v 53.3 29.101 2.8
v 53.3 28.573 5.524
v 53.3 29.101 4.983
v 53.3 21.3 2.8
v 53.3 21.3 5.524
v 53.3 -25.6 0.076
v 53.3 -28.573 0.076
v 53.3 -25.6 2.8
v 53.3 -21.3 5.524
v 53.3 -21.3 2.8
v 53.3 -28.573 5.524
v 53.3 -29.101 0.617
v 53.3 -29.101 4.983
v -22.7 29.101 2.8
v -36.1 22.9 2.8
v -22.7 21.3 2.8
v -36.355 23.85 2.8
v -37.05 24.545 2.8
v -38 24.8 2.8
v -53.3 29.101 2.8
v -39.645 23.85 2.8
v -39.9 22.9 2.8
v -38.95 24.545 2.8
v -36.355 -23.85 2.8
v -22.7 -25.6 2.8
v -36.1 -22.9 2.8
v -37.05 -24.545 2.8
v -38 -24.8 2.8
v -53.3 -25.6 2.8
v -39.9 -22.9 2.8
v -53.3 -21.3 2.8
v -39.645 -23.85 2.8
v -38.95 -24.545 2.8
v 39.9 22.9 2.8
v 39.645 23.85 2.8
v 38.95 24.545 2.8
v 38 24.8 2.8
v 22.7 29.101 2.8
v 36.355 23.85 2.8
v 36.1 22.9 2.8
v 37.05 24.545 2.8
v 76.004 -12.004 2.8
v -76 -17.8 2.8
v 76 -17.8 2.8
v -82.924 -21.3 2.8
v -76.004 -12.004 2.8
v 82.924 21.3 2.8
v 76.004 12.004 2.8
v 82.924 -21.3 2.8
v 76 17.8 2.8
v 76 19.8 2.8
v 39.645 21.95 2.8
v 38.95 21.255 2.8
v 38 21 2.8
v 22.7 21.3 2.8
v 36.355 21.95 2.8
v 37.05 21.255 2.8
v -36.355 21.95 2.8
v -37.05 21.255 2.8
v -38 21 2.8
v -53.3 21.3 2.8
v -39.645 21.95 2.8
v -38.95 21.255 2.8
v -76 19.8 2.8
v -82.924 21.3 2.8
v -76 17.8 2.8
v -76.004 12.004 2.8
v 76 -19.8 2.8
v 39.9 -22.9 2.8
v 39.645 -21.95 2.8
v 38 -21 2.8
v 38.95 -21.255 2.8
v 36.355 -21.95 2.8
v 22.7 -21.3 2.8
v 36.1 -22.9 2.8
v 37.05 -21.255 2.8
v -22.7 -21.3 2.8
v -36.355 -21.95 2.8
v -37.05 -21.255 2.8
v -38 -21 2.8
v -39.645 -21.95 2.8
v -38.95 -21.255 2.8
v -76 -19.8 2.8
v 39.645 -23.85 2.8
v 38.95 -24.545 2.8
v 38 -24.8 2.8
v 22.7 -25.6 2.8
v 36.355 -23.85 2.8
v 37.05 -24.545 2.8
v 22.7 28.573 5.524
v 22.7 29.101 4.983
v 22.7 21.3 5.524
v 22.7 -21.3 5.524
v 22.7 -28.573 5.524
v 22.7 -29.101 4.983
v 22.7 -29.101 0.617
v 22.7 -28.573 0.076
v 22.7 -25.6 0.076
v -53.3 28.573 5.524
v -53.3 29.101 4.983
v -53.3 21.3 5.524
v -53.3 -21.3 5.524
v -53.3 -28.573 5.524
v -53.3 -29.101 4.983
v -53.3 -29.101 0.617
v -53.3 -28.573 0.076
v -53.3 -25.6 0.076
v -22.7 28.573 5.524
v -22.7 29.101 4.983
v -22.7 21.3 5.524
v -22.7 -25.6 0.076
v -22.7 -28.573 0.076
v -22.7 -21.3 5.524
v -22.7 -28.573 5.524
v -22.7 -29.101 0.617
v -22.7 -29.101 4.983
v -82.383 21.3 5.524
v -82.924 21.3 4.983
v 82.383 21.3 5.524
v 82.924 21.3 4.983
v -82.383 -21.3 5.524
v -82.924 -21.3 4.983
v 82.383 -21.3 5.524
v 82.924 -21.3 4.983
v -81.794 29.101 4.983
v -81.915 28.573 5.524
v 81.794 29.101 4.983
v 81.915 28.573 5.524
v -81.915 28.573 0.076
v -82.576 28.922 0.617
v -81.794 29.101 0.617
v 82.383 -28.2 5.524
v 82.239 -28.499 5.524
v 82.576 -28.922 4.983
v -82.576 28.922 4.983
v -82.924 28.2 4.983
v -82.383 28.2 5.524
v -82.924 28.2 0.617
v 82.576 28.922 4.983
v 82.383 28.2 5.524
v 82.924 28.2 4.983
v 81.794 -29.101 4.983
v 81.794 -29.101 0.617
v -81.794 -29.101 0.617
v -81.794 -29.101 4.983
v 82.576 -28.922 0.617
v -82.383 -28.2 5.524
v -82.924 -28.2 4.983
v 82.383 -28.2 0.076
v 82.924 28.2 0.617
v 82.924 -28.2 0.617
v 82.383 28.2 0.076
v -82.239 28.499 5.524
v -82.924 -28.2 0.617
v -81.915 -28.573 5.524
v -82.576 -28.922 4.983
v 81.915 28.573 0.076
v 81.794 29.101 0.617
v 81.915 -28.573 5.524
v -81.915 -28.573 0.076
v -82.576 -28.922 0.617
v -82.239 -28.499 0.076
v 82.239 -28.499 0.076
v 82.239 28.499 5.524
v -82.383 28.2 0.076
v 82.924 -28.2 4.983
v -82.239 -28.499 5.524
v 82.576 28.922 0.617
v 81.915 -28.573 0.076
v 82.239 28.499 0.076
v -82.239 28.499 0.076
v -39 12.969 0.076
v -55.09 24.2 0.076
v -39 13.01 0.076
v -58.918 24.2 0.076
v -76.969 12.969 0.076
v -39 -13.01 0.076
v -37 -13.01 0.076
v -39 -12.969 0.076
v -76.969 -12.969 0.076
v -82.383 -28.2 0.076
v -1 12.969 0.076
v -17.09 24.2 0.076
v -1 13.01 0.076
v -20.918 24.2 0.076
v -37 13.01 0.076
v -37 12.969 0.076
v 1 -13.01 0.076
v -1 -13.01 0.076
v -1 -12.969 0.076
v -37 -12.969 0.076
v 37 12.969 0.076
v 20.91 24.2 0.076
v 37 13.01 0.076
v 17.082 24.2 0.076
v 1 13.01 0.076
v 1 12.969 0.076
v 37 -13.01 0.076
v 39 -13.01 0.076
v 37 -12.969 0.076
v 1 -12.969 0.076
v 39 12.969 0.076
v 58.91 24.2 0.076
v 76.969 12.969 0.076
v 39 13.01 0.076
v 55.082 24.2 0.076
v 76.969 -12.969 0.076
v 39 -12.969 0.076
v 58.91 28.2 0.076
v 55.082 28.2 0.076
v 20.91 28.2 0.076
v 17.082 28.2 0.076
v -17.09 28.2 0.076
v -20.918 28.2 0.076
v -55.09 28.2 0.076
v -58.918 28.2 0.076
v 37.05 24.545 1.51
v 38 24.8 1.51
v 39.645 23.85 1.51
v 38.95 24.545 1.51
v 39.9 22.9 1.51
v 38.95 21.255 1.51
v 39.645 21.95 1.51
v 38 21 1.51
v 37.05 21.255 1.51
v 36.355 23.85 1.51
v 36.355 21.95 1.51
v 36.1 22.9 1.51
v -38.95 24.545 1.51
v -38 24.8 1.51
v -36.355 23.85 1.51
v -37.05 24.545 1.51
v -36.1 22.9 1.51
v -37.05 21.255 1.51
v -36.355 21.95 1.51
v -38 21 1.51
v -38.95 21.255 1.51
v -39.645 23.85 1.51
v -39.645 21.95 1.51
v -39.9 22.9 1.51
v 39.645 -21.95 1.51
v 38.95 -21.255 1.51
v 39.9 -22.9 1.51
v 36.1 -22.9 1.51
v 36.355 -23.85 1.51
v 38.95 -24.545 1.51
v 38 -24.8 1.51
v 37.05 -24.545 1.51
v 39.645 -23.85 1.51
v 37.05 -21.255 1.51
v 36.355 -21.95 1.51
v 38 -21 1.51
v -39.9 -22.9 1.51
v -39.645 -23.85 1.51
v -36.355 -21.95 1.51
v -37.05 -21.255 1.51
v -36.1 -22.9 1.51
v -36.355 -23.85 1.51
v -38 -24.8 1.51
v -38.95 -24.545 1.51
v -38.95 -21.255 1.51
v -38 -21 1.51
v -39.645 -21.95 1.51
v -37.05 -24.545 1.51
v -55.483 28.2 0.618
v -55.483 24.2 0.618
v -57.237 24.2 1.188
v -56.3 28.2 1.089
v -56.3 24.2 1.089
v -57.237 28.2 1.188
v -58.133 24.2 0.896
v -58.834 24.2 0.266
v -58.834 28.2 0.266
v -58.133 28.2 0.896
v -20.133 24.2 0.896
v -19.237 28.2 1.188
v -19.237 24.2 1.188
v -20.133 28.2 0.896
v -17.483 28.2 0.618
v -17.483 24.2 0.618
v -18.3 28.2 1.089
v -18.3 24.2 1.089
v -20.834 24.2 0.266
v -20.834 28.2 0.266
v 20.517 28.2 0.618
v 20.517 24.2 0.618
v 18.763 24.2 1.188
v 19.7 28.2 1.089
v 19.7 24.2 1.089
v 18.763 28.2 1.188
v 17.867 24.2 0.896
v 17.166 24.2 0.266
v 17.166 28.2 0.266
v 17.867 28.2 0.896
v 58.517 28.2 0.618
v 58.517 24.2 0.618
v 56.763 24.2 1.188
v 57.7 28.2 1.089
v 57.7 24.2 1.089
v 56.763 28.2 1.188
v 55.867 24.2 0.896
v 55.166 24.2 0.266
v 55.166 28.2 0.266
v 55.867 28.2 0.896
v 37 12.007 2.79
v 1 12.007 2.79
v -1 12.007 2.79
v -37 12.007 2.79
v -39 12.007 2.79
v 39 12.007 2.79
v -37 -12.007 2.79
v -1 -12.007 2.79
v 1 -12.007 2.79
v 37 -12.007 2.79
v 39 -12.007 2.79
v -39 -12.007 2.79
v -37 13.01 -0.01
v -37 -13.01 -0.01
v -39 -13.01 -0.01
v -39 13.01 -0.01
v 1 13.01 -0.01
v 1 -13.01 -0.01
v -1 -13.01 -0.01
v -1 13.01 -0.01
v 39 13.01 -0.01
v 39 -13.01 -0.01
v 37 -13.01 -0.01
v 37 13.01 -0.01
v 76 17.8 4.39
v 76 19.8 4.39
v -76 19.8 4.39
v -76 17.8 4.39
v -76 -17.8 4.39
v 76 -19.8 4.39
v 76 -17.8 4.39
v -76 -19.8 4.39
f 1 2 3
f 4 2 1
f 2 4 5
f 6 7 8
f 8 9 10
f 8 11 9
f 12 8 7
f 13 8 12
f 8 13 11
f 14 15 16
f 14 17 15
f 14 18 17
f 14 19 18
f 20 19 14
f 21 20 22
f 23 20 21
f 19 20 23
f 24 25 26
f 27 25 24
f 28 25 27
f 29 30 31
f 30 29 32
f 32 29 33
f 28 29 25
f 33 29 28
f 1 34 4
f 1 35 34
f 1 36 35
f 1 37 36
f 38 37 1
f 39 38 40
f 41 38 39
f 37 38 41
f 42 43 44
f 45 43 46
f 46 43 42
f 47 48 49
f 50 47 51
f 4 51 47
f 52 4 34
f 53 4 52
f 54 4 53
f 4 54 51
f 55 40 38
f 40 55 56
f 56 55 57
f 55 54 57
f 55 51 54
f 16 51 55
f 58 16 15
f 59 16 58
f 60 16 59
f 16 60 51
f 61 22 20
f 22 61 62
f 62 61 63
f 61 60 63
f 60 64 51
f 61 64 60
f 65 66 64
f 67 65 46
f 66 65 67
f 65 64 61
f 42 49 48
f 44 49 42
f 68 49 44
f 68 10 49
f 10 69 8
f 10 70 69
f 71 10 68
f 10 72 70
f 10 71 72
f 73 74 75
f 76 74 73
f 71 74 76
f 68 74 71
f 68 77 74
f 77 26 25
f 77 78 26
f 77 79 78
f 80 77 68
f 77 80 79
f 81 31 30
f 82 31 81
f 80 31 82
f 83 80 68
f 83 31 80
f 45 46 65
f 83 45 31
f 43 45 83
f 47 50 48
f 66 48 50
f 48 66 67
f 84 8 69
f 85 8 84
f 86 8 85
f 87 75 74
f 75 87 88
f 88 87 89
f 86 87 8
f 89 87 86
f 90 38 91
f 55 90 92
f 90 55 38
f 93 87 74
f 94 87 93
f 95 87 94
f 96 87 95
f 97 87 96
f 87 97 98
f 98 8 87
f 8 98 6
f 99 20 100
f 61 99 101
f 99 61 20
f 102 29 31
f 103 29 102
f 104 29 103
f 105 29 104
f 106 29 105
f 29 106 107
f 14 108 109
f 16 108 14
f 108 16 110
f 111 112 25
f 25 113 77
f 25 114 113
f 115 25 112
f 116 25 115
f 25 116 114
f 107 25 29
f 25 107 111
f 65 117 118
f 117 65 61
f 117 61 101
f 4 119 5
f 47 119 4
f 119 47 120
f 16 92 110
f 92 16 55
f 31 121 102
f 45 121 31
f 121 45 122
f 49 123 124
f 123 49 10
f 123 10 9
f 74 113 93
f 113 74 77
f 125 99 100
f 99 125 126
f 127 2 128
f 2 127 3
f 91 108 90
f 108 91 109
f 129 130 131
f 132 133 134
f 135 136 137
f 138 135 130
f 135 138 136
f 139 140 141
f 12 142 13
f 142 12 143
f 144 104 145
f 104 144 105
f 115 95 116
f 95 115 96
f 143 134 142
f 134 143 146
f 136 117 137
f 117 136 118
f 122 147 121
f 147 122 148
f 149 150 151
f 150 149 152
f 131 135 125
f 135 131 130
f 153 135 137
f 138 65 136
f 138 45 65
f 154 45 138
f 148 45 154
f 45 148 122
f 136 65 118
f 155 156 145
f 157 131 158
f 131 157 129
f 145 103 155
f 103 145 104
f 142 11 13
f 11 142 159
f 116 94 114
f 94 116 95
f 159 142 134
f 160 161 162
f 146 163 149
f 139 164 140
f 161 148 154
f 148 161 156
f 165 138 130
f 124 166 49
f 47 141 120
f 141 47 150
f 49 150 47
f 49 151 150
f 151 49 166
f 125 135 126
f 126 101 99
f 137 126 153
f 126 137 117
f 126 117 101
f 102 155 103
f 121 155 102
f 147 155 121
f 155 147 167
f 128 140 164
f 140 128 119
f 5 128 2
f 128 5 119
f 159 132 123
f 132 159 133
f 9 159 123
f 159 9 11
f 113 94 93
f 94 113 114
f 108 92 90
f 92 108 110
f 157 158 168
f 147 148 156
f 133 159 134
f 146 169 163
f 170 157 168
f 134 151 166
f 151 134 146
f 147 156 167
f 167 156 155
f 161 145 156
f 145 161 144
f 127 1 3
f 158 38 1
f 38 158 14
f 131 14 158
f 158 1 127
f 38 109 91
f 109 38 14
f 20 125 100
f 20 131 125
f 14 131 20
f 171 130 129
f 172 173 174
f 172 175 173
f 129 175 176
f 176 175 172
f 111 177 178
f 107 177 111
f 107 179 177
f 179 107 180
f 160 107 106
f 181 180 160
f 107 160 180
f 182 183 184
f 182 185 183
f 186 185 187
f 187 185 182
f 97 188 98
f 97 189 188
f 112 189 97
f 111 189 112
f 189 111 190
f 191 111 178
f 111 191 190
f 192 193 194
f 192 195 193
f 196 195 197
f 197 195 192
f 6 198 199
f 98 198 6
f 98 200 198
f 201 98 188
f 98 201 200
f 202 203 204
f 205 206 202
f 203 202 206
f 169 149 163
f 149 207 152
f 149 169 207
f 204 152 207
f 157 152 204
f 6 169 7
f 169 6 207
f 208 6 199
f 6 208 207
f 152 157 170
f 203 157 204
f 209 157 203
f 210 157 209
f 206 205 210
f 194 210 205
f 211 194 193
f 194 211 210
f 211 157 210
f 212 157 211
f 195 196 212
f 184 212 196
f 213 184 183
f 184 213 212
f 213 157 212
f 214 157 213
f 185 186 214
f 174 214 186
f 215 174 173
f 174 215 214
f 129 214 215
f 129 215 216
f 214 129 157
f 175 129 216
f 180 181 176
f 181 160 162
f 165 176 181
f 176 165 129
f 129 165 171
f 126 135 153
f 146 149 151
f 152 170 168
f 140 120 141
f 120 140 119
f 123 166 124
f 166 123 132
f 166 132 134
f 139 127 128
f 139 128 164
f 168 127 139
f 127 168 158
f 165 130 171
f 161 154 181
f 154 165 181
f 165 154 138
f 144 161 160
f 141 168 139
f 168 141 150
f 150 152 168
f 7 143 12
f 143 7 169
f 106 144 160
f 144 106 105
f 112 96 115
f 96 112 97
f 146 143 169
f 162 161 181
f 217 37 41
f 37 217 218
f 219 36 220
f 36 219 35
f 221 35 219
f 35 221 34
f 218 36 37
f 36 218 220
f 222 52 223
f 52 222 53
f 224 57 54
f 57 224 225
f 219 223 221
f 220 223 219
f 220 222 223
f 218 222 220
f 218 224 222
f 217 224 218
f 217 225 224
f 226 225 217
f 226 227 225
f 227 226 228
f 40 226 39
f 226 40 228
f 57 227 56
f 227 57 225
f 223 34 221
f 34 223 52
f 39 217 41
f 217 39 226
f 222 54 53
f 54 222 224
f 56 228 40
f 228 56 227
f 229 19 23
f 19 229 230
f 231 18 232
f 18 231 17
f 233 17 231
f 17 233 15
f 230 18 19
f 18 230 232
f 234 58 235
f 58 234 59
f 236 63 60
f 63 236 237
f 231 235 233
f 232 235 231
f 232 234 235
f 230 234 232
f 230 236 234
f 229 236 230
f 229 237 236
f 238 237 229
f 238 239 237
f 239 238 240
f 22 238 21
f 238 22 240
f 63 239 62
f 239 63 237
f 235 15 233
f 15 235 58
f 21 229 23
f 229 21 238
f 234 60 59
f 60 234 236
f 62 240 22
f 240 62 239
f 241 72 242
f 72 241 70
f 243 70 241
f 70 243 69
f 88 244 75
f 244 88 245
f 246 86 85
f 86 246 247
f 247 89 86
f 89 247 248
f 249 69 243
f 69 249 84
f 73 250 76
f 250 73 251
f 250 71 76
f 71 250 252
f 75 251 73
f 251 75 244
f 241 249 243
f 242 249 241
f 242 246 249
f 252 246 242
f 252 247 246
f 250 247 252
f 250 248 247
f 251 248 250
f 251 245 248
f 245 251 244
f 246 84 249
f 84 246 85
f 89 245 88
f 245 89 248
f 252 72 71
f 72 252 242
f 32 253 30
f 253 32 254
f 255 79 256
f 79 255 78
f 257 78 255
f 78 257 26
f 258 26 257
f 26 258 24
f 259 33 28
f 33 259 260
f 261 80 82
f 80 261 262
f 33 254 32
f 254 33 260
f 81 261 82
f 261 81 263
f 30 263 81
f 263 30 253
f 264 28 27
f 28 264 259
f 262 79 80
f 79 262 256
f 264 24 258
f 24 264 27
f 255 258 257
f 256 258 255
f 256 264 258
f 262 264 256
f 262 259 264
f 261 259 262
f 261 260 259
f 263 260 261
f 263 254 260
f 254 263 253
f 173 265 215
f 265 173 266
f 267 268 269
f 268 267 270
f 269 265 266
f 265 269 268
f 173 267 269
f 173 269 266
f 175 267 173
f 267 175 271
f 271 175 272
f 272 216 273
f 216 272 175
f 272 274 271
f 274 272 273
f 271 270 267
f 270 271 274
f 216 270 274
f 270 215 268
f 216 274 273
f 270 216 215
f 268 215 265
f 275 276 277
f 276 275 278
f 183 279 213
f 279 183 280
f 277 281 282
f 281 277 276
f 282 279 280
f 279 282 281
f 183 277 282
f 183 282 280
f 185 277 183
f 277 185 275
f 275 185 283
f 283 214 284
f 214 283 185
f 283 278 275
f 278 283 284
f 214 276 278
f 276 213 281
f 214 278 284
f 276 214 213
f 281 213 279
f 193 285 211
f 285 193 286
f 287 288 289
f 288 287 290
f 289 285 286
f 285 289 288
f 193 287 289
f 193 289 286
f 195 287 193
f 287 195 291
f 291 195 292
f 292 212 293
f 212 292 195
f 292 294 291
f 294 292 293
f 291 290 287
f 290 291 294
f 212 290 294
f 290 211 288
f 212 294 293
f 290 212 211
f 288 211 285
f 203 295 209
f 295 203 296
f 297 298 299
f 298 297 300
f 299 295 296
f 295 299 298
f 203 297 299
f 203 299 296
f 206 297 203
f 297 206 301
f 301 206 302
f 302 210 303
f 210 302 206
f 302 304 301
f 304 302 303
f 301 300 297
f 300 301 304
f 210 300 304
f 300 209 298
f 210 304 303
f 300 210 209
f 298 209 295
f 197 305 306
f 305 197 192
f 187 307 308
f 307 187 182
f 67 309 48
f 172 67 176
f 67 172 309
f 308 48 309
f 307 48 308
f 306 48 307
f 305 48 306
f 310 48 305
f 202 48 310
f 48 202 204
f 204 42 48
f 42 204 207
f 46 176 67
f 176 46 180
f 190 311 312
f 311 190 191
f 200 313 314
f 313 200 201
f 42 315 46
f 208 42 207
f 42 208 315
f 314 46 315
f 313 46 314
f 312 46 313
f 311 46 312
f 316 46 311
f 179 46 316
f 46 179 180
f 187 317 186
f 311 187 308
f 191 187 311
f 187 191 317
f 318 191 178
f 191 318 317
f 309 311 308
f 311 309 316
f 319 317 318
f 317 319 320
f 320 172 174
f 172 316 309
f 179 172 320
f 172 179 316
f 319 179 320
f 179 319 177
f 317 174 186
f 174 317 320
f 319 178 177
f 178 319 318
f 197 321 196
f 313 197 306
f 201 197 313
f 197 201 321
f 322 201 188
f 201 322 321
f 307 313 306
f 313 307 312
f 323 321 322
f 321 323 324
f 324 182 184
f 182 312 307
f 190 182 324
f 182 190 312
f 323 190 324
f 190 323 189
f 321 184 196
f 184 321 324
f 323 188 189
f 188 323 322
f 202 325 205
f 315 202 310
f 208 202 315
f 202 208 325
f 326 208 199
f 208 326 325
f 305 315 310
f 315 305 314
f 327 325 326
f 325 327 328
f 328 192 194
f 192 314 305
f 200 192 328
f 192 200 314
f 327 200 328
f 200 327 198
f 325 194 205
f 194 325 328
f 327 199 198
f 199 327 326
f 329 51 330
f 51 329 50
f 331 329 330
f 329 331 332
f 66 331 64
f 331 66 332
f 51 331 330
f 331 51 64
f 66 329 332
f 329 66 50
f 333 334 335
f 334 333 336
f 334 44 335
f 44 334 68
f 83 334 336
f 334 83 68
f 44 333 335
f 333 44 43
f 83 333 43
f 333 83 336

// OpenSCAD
// -*- mode: SCAD ; c-file-style: "ellemtel" ; coding: utf-8 -*-
//
// Holder to scan 135 film strips with a Reflecta ProScan 10T
//
// Copyright 2018 Roland Sieker <ospalh@gmail.com>
// Licence: CC-BY-SA 4.0


/* [Global] */


// ... to preview. You will get both parts when you click "Create Thing".
part = "halter"; // [halter: film holder, einsatz: film holder clamp]

// Set this to "render" and click on "Create Thing" when done with the setup.
preview = 1; // [0:render, 1:preview]

/* [Holder] */

// Width of the holder. This one and the next one are the two values you do need to set up for your scanner. Preset is for a Reflecta proScan. Maybe subtract half a millimtre for a better fit.
holder_width = 58.4;  // [20:0.1:150]

// Height or thickness of the holder. See above. You know they were too high when you need a mallet to go from one image to the next...
holder_thickness = 5.6;  // [3:0.1:10]

// How many exposures on the longest strips you want to fit into this. Make sure the resulting holder still fits onto your print bed.
images_per_strip = 4;  // [1:1:8]

/* [Magnets] */

// Diameter of the magnet hole. Add clearance by hand here. Set to 0 for no magnet holes.
magnet_diameter = 3.8;  // [0:0.1:15]
// Height or thickness of the magnet. Make sure to use magnets flat enough to fit.
magnet_height = 1;  // [0.5:0.1:3]

/* [Hidden] */

// Das ganze Filmgroessen-Geraffel wieder verstecken: ein thing pro
// Film. Teil der Automatik (mit/ohne Stege, Lang-oder Kurzkerbe) sind so
// halbwegs inaktiv.


// Width of the film
film_width = 35;  // [8:0.1:70]
// Length from the left edge of an exposure to its right edge
image_width = 36; // [8:0.1:100]
// Length from one point (e.g. left edge) of one exposure to the same point of the next exposure. This minus the image width is used for the vertical ridges, if it's positive.
image_pitch = 8*4.75;  // 8 perf
// Size of an exposure from bottom to top.
image_height = 24; // [7:0.1:68]


bildabstand = max(image_pitch, image_width);
l_filmsteg = max(0, bildabstand-image_width);
r_r = 1.0;  // Rundungsradius

// Auch wichtig:
l_zk = 4;  // Laenge Zentrierkerbe
b_zk = 4;  // Breite Zentrierkerbe
h_zk = 1.2;  // Tiefe der Zentrierkerbe
w_zk = 1;  // Wand bzw Abstand der Zentrierkerbe vom Rand



l_griff = 30;
o_griff = 30;
w_griff = 3;
magnet_y_off = 0;  // Abstand Magnet vom Einsatz

kurzsteg_grenze = 1;  // Weniger als 1 mm pro Seite: Kurzstege

mit_langsteg = ( ((film_width-image_height)/2) >= kurzsteg_grenze);


w_steg = 2;  // Breite fuer Stuecke, die den Film zentrieren.
l_kurzsteg = 0.4*bildabstand;  // Laenge fuer Stuecke, die den Film zentrieren,
// wenn wier keine Fensterstege machen



w_schraeg = 1;  // Breite der Abschraegung rund um die Filmfenster




// *******************************************************
// Extra parameters. These can be changed reasonably safely.


w = 1.8;  // Wall width
p = 1.2;  // Bottom, top plate height
c = 0.6;  // Clearance
c_z = 0.3;  // Clearance in z direction. Mostly for the magnet hole and centering ridge
angle = 60; // Overhangs much below 60 degrees are a problem for me


// Halbwegs wichtig
h_steg = 1.6;  // Hoehe fuer Stuecke, die den Film zentrieren.
h_nut = h_steg + c_z;  // Tiefe fuer Stuecke, auf denen der Film nicht aufliegt



// *******************************************************
// Some shortcuts. These shouldn't be changed

tau = 2 * PI;  // pi is still wrong. tau = circumference / r

xy_factor = 1/tan(angle);
// To get from a height to a horizontal width inclined correctly
z_factor = tan(angle);  // The other way around

some_distance = 1.2 * holder_width;
ms = 0.01;  // Muggeseggele.

// fn for differently sized objects and fs, fa; all for preview or rendering.
pna = 40;
pnb = 15;
pa = 5;
ps = 1;
rna = 180;
rnb = 30;
ra = 1;
rs = 0.1;
function na() = (preview) ? pna : rna;
function nb() = (preview) ? pnb : rnb;
$fs = (preview) ? ps : rs;
$fa = (preview) ? pa : ra;

l_fenster = bildabstand * images_per_strip;
l_rand = 2 * w_steg + w_schraeg + 2;
w_rand = w_schraeg + 8;
l_ue_a =  l_fenster + 2*l_rand;
w_einsatz = image_height + 2 * w_rand;
h_bd = holder_thickness/2;  // Hoehe Boden oder Deckel

to_griff = l_ue_a/2 - o_griff - l_griff/2;



// *******************************************************
// End setup




// *******************************************************
// Generate the parts


print_part();
// filmhalter();
// einsatz();
// preview_parts();
// stack_parts();



module print_part()
{
   if ("halter" == part)
   {
      filmhalter();
   }
   if ("einsatz" == part)
   {
      einsatz();
   }
}

module preview_parts()
{
   filmhalter();
   translate([0, some_distance, 0])
   {
      einsatz();
   }
}

module stack_parts()
{
   // intersection()
   {
       // color("yellow")
      {
         filmhalter();
      }
      translate([0,0,holder_thickness + ms])
      {
         rotate([0,180,0])
         {
            // color("red")
            {
               einsatz();
            }
         }
      }
   }
}

// *******************************************************
// Code for the parts themselves


module filmhalter()
{
   difference()
   {
      basis_filmhalter();
      fenster();
      magnetausschnitte();
      kerben();
   }
   fensterstege();
   bodenstege();
}

module einsatz()
{
   difference()
   {
      union()
      {
         difference()
         {
            basis_einsatz();
            fenster();
         }
         fensterstege();
      }
      einsatzausschnitte();
      // magnetausschnitte(magnet_diameter/2);
      magnetausschnitte();
   }

}


module basis_filmhalter()
{
   translate([0,0,h_bd])
   {
      difference()
      {
         massiver_halter();
         einsatz_ausschnitt(c);
      }
   }
}


module basis_einsatz()
{
   translate([0,0,h_bd])
   {
      intersection()
      {
         massiver_halter();
         rotate([0,180,0])
         {
            einsatz_ausschnitt(0);
         }
      }
   }

}

module massiver_halter()
{
   hull()
   {
      vosp();
      mirror([0,0,1])
      {
         vosp();
      }
   }

   module vosp()
   {
      tosp();
      mirror([0,1,0])
      {
         tosp();
      }
   }
   module tosp()
   {
      osp();
      mirror([1,0,0])
      {
         osp();
      }

   }

   module osp()
   {
      translate([l_ue_a/2-r_r, holder_width/2-r_r, holder_thickness/2-r_r])
      {
         sphere(r=r_r);
      }
   }
}


module einsatz_ausschnitt(ec)
{
   translate([0, 0, holder_thickness])
   {
      cube([l_ue_a+2*ms, w_einsatz + ec, 2*holder_thickness], center=true);
      grip_cut();
      mirror()
      {
         grip_cut();
      }
   }
   module grip_cut()
   {
      translate([to_griff, 0, 0])
      {
         cube([l_griff + ec, holder_width + 2*ms, 2*holder_thickness], center=true);
         translate([0, -holder_width/2, 0])
         {
            cube([l_griff + ec, 2*w_griff+2*ec, 4*holder_thickness], center=true);
         }
      }
   }
}

module fenster()
{
   translate([0, 0, h_bd])
   {
      hull()
      {
         translate([0,0,-0.5+ms])
         {
            cube([l_fenster, image_height, 1], center=true);
         }
         translate([0,0,-h_bd-0.5-ms])
         {
            cube(
               [l_fenster+2*w_schraeg, image_height+2*w_schraeg, 1], center=true);
         }
      }

   }
}


module magnetausschnitte()
{
   if (magnet_diameter > 0 && magnet_height > 0)
   {
      magnetausschnitt(1, 1);
      magnetausschnitt(-1, 1);
      magnetausschnitt(1, -1);
      magnetausschnitt(-1, -1);
   }
}

module magnetausschnitt(xf, yf)
{
   yo_mag = w_einsatz/2 + magnet_diameter/2 +magnet_y_off;


   // Mittig in den Griffen.
   translate(
      [xf * (to_griff), yf * (yo_mag), h_bd - magnet_height-c_z + ms])
   {
      cylinder(d=magnet_diameter, h=magnet_height+c_z);  // N.B. Spiel ist schon im magnet_diameter
      // eingerechnet
   }
}

module bodenstege()
{
   translate([0, 0, -ms+h_steg/2+h_bd])
   {
      if (mit_langsteg)
      {
         langbodensteg();
         rotate(180)
         {
            langbodensteg();
         }
      }
      else
      {
         kurzbodenstege();
         rotate(180)
         {
            kurzbodenstege();
         }
      }
   }
   module langbodensteg()
   {
      translate([0,w_steg/2+film_width/2+c/2, 0])
      {
         cube([l_fenster, w_steg, h_steg], center=true);
      }
   }
   module kurzbodenstege()
   {
      for (i=[0:images_per_strip-1])
      {
         translate([-l_fenster/2 + (0.5 + i) * bildabstand, w_steg/2+film_width/2+c/2, 0])
         {
            cube([l_kurzsteg, w_steg, h_steg], center=true);
         }
      }
   }
}

module einsatzausschnitte()
{
   translate([0, 0, h_bd + ms-h_nut/2])
   {
      if (mit_langsteg)
      {
         langausschnitt();
         rotate(180)
         {
            langausschnitt();
         }
      }
      else
      {
         kurzausschnitte();
         rotate(180)
         {
            kurzausschnitte();
         }
      }
   }
   module langausschnitt()
   {
      translate([0,w_steg/2+film_width/2+c/2,0])
      {
         cube([l_fenster+6*c, w_steg+2*c, h_nut], center=true);
      }
   }
   module kurzausschnitte()
   {
      for (i=[0:images_per_strip-1])
      {
         translate([-l_fenster/2 + (0.5 + i) * bildabstand, w_steg/2+film_width/2+c/2-film_width/4 + image_height/4, 0])
         {
            cube([l_kurzsteg+2*c, w_steg+2*c+film_width/2 - image_height/2, h_nut], center=true);
         }
      }
   }
}


module fensterstege()
{
   if (l_filmsteg > 0)
   {
      for (i=[1:images_per_strip-1])
      {
         translate([-l_fenster/2 + i * bildabstand, 0, h_bd/2-ms])
         {
            cube([l_filmsteg, image_height+2*w_schraeg + 2*ms ,h_bd], center=true);
         }
      }
   }
}

module kerben()
{
   // Den Radius der Zentrierkerbe kann mensch per Pythagoras bestimmen.
   // Hypothenuse = r_zk
   // 1. Kathete = l_zk/2
   // 2. Kathete = r_zk - h_zk
   // h_zk > 0
   // r_zk * r_zk = l_zk * l_zk / 4 + r_zk * r_zk - 2 * r_zk * h_zk + h_zk * h_zk
   // 0 = l_zk * l_zk / 4 - 2 * r_zk * h_zk + h_zk * h_zk
   // 2 * r_zk * h_zk =
   r_zk = (l_zk * l_zk / 4 + h_zk * h_zk) / (2 * h_zk);
   for (i=[0:images_per_strip-1])
   {
      translate(
         [-l_fenster/2 + i * bildabstand + bildabstand/2, holder_width/2 - w_zk, h_zk-r_zk])
      {
         rotate([90,0,0])
         {
            cylinder(r=r_zk, h=b_zk);
         }
      }
   }

}
